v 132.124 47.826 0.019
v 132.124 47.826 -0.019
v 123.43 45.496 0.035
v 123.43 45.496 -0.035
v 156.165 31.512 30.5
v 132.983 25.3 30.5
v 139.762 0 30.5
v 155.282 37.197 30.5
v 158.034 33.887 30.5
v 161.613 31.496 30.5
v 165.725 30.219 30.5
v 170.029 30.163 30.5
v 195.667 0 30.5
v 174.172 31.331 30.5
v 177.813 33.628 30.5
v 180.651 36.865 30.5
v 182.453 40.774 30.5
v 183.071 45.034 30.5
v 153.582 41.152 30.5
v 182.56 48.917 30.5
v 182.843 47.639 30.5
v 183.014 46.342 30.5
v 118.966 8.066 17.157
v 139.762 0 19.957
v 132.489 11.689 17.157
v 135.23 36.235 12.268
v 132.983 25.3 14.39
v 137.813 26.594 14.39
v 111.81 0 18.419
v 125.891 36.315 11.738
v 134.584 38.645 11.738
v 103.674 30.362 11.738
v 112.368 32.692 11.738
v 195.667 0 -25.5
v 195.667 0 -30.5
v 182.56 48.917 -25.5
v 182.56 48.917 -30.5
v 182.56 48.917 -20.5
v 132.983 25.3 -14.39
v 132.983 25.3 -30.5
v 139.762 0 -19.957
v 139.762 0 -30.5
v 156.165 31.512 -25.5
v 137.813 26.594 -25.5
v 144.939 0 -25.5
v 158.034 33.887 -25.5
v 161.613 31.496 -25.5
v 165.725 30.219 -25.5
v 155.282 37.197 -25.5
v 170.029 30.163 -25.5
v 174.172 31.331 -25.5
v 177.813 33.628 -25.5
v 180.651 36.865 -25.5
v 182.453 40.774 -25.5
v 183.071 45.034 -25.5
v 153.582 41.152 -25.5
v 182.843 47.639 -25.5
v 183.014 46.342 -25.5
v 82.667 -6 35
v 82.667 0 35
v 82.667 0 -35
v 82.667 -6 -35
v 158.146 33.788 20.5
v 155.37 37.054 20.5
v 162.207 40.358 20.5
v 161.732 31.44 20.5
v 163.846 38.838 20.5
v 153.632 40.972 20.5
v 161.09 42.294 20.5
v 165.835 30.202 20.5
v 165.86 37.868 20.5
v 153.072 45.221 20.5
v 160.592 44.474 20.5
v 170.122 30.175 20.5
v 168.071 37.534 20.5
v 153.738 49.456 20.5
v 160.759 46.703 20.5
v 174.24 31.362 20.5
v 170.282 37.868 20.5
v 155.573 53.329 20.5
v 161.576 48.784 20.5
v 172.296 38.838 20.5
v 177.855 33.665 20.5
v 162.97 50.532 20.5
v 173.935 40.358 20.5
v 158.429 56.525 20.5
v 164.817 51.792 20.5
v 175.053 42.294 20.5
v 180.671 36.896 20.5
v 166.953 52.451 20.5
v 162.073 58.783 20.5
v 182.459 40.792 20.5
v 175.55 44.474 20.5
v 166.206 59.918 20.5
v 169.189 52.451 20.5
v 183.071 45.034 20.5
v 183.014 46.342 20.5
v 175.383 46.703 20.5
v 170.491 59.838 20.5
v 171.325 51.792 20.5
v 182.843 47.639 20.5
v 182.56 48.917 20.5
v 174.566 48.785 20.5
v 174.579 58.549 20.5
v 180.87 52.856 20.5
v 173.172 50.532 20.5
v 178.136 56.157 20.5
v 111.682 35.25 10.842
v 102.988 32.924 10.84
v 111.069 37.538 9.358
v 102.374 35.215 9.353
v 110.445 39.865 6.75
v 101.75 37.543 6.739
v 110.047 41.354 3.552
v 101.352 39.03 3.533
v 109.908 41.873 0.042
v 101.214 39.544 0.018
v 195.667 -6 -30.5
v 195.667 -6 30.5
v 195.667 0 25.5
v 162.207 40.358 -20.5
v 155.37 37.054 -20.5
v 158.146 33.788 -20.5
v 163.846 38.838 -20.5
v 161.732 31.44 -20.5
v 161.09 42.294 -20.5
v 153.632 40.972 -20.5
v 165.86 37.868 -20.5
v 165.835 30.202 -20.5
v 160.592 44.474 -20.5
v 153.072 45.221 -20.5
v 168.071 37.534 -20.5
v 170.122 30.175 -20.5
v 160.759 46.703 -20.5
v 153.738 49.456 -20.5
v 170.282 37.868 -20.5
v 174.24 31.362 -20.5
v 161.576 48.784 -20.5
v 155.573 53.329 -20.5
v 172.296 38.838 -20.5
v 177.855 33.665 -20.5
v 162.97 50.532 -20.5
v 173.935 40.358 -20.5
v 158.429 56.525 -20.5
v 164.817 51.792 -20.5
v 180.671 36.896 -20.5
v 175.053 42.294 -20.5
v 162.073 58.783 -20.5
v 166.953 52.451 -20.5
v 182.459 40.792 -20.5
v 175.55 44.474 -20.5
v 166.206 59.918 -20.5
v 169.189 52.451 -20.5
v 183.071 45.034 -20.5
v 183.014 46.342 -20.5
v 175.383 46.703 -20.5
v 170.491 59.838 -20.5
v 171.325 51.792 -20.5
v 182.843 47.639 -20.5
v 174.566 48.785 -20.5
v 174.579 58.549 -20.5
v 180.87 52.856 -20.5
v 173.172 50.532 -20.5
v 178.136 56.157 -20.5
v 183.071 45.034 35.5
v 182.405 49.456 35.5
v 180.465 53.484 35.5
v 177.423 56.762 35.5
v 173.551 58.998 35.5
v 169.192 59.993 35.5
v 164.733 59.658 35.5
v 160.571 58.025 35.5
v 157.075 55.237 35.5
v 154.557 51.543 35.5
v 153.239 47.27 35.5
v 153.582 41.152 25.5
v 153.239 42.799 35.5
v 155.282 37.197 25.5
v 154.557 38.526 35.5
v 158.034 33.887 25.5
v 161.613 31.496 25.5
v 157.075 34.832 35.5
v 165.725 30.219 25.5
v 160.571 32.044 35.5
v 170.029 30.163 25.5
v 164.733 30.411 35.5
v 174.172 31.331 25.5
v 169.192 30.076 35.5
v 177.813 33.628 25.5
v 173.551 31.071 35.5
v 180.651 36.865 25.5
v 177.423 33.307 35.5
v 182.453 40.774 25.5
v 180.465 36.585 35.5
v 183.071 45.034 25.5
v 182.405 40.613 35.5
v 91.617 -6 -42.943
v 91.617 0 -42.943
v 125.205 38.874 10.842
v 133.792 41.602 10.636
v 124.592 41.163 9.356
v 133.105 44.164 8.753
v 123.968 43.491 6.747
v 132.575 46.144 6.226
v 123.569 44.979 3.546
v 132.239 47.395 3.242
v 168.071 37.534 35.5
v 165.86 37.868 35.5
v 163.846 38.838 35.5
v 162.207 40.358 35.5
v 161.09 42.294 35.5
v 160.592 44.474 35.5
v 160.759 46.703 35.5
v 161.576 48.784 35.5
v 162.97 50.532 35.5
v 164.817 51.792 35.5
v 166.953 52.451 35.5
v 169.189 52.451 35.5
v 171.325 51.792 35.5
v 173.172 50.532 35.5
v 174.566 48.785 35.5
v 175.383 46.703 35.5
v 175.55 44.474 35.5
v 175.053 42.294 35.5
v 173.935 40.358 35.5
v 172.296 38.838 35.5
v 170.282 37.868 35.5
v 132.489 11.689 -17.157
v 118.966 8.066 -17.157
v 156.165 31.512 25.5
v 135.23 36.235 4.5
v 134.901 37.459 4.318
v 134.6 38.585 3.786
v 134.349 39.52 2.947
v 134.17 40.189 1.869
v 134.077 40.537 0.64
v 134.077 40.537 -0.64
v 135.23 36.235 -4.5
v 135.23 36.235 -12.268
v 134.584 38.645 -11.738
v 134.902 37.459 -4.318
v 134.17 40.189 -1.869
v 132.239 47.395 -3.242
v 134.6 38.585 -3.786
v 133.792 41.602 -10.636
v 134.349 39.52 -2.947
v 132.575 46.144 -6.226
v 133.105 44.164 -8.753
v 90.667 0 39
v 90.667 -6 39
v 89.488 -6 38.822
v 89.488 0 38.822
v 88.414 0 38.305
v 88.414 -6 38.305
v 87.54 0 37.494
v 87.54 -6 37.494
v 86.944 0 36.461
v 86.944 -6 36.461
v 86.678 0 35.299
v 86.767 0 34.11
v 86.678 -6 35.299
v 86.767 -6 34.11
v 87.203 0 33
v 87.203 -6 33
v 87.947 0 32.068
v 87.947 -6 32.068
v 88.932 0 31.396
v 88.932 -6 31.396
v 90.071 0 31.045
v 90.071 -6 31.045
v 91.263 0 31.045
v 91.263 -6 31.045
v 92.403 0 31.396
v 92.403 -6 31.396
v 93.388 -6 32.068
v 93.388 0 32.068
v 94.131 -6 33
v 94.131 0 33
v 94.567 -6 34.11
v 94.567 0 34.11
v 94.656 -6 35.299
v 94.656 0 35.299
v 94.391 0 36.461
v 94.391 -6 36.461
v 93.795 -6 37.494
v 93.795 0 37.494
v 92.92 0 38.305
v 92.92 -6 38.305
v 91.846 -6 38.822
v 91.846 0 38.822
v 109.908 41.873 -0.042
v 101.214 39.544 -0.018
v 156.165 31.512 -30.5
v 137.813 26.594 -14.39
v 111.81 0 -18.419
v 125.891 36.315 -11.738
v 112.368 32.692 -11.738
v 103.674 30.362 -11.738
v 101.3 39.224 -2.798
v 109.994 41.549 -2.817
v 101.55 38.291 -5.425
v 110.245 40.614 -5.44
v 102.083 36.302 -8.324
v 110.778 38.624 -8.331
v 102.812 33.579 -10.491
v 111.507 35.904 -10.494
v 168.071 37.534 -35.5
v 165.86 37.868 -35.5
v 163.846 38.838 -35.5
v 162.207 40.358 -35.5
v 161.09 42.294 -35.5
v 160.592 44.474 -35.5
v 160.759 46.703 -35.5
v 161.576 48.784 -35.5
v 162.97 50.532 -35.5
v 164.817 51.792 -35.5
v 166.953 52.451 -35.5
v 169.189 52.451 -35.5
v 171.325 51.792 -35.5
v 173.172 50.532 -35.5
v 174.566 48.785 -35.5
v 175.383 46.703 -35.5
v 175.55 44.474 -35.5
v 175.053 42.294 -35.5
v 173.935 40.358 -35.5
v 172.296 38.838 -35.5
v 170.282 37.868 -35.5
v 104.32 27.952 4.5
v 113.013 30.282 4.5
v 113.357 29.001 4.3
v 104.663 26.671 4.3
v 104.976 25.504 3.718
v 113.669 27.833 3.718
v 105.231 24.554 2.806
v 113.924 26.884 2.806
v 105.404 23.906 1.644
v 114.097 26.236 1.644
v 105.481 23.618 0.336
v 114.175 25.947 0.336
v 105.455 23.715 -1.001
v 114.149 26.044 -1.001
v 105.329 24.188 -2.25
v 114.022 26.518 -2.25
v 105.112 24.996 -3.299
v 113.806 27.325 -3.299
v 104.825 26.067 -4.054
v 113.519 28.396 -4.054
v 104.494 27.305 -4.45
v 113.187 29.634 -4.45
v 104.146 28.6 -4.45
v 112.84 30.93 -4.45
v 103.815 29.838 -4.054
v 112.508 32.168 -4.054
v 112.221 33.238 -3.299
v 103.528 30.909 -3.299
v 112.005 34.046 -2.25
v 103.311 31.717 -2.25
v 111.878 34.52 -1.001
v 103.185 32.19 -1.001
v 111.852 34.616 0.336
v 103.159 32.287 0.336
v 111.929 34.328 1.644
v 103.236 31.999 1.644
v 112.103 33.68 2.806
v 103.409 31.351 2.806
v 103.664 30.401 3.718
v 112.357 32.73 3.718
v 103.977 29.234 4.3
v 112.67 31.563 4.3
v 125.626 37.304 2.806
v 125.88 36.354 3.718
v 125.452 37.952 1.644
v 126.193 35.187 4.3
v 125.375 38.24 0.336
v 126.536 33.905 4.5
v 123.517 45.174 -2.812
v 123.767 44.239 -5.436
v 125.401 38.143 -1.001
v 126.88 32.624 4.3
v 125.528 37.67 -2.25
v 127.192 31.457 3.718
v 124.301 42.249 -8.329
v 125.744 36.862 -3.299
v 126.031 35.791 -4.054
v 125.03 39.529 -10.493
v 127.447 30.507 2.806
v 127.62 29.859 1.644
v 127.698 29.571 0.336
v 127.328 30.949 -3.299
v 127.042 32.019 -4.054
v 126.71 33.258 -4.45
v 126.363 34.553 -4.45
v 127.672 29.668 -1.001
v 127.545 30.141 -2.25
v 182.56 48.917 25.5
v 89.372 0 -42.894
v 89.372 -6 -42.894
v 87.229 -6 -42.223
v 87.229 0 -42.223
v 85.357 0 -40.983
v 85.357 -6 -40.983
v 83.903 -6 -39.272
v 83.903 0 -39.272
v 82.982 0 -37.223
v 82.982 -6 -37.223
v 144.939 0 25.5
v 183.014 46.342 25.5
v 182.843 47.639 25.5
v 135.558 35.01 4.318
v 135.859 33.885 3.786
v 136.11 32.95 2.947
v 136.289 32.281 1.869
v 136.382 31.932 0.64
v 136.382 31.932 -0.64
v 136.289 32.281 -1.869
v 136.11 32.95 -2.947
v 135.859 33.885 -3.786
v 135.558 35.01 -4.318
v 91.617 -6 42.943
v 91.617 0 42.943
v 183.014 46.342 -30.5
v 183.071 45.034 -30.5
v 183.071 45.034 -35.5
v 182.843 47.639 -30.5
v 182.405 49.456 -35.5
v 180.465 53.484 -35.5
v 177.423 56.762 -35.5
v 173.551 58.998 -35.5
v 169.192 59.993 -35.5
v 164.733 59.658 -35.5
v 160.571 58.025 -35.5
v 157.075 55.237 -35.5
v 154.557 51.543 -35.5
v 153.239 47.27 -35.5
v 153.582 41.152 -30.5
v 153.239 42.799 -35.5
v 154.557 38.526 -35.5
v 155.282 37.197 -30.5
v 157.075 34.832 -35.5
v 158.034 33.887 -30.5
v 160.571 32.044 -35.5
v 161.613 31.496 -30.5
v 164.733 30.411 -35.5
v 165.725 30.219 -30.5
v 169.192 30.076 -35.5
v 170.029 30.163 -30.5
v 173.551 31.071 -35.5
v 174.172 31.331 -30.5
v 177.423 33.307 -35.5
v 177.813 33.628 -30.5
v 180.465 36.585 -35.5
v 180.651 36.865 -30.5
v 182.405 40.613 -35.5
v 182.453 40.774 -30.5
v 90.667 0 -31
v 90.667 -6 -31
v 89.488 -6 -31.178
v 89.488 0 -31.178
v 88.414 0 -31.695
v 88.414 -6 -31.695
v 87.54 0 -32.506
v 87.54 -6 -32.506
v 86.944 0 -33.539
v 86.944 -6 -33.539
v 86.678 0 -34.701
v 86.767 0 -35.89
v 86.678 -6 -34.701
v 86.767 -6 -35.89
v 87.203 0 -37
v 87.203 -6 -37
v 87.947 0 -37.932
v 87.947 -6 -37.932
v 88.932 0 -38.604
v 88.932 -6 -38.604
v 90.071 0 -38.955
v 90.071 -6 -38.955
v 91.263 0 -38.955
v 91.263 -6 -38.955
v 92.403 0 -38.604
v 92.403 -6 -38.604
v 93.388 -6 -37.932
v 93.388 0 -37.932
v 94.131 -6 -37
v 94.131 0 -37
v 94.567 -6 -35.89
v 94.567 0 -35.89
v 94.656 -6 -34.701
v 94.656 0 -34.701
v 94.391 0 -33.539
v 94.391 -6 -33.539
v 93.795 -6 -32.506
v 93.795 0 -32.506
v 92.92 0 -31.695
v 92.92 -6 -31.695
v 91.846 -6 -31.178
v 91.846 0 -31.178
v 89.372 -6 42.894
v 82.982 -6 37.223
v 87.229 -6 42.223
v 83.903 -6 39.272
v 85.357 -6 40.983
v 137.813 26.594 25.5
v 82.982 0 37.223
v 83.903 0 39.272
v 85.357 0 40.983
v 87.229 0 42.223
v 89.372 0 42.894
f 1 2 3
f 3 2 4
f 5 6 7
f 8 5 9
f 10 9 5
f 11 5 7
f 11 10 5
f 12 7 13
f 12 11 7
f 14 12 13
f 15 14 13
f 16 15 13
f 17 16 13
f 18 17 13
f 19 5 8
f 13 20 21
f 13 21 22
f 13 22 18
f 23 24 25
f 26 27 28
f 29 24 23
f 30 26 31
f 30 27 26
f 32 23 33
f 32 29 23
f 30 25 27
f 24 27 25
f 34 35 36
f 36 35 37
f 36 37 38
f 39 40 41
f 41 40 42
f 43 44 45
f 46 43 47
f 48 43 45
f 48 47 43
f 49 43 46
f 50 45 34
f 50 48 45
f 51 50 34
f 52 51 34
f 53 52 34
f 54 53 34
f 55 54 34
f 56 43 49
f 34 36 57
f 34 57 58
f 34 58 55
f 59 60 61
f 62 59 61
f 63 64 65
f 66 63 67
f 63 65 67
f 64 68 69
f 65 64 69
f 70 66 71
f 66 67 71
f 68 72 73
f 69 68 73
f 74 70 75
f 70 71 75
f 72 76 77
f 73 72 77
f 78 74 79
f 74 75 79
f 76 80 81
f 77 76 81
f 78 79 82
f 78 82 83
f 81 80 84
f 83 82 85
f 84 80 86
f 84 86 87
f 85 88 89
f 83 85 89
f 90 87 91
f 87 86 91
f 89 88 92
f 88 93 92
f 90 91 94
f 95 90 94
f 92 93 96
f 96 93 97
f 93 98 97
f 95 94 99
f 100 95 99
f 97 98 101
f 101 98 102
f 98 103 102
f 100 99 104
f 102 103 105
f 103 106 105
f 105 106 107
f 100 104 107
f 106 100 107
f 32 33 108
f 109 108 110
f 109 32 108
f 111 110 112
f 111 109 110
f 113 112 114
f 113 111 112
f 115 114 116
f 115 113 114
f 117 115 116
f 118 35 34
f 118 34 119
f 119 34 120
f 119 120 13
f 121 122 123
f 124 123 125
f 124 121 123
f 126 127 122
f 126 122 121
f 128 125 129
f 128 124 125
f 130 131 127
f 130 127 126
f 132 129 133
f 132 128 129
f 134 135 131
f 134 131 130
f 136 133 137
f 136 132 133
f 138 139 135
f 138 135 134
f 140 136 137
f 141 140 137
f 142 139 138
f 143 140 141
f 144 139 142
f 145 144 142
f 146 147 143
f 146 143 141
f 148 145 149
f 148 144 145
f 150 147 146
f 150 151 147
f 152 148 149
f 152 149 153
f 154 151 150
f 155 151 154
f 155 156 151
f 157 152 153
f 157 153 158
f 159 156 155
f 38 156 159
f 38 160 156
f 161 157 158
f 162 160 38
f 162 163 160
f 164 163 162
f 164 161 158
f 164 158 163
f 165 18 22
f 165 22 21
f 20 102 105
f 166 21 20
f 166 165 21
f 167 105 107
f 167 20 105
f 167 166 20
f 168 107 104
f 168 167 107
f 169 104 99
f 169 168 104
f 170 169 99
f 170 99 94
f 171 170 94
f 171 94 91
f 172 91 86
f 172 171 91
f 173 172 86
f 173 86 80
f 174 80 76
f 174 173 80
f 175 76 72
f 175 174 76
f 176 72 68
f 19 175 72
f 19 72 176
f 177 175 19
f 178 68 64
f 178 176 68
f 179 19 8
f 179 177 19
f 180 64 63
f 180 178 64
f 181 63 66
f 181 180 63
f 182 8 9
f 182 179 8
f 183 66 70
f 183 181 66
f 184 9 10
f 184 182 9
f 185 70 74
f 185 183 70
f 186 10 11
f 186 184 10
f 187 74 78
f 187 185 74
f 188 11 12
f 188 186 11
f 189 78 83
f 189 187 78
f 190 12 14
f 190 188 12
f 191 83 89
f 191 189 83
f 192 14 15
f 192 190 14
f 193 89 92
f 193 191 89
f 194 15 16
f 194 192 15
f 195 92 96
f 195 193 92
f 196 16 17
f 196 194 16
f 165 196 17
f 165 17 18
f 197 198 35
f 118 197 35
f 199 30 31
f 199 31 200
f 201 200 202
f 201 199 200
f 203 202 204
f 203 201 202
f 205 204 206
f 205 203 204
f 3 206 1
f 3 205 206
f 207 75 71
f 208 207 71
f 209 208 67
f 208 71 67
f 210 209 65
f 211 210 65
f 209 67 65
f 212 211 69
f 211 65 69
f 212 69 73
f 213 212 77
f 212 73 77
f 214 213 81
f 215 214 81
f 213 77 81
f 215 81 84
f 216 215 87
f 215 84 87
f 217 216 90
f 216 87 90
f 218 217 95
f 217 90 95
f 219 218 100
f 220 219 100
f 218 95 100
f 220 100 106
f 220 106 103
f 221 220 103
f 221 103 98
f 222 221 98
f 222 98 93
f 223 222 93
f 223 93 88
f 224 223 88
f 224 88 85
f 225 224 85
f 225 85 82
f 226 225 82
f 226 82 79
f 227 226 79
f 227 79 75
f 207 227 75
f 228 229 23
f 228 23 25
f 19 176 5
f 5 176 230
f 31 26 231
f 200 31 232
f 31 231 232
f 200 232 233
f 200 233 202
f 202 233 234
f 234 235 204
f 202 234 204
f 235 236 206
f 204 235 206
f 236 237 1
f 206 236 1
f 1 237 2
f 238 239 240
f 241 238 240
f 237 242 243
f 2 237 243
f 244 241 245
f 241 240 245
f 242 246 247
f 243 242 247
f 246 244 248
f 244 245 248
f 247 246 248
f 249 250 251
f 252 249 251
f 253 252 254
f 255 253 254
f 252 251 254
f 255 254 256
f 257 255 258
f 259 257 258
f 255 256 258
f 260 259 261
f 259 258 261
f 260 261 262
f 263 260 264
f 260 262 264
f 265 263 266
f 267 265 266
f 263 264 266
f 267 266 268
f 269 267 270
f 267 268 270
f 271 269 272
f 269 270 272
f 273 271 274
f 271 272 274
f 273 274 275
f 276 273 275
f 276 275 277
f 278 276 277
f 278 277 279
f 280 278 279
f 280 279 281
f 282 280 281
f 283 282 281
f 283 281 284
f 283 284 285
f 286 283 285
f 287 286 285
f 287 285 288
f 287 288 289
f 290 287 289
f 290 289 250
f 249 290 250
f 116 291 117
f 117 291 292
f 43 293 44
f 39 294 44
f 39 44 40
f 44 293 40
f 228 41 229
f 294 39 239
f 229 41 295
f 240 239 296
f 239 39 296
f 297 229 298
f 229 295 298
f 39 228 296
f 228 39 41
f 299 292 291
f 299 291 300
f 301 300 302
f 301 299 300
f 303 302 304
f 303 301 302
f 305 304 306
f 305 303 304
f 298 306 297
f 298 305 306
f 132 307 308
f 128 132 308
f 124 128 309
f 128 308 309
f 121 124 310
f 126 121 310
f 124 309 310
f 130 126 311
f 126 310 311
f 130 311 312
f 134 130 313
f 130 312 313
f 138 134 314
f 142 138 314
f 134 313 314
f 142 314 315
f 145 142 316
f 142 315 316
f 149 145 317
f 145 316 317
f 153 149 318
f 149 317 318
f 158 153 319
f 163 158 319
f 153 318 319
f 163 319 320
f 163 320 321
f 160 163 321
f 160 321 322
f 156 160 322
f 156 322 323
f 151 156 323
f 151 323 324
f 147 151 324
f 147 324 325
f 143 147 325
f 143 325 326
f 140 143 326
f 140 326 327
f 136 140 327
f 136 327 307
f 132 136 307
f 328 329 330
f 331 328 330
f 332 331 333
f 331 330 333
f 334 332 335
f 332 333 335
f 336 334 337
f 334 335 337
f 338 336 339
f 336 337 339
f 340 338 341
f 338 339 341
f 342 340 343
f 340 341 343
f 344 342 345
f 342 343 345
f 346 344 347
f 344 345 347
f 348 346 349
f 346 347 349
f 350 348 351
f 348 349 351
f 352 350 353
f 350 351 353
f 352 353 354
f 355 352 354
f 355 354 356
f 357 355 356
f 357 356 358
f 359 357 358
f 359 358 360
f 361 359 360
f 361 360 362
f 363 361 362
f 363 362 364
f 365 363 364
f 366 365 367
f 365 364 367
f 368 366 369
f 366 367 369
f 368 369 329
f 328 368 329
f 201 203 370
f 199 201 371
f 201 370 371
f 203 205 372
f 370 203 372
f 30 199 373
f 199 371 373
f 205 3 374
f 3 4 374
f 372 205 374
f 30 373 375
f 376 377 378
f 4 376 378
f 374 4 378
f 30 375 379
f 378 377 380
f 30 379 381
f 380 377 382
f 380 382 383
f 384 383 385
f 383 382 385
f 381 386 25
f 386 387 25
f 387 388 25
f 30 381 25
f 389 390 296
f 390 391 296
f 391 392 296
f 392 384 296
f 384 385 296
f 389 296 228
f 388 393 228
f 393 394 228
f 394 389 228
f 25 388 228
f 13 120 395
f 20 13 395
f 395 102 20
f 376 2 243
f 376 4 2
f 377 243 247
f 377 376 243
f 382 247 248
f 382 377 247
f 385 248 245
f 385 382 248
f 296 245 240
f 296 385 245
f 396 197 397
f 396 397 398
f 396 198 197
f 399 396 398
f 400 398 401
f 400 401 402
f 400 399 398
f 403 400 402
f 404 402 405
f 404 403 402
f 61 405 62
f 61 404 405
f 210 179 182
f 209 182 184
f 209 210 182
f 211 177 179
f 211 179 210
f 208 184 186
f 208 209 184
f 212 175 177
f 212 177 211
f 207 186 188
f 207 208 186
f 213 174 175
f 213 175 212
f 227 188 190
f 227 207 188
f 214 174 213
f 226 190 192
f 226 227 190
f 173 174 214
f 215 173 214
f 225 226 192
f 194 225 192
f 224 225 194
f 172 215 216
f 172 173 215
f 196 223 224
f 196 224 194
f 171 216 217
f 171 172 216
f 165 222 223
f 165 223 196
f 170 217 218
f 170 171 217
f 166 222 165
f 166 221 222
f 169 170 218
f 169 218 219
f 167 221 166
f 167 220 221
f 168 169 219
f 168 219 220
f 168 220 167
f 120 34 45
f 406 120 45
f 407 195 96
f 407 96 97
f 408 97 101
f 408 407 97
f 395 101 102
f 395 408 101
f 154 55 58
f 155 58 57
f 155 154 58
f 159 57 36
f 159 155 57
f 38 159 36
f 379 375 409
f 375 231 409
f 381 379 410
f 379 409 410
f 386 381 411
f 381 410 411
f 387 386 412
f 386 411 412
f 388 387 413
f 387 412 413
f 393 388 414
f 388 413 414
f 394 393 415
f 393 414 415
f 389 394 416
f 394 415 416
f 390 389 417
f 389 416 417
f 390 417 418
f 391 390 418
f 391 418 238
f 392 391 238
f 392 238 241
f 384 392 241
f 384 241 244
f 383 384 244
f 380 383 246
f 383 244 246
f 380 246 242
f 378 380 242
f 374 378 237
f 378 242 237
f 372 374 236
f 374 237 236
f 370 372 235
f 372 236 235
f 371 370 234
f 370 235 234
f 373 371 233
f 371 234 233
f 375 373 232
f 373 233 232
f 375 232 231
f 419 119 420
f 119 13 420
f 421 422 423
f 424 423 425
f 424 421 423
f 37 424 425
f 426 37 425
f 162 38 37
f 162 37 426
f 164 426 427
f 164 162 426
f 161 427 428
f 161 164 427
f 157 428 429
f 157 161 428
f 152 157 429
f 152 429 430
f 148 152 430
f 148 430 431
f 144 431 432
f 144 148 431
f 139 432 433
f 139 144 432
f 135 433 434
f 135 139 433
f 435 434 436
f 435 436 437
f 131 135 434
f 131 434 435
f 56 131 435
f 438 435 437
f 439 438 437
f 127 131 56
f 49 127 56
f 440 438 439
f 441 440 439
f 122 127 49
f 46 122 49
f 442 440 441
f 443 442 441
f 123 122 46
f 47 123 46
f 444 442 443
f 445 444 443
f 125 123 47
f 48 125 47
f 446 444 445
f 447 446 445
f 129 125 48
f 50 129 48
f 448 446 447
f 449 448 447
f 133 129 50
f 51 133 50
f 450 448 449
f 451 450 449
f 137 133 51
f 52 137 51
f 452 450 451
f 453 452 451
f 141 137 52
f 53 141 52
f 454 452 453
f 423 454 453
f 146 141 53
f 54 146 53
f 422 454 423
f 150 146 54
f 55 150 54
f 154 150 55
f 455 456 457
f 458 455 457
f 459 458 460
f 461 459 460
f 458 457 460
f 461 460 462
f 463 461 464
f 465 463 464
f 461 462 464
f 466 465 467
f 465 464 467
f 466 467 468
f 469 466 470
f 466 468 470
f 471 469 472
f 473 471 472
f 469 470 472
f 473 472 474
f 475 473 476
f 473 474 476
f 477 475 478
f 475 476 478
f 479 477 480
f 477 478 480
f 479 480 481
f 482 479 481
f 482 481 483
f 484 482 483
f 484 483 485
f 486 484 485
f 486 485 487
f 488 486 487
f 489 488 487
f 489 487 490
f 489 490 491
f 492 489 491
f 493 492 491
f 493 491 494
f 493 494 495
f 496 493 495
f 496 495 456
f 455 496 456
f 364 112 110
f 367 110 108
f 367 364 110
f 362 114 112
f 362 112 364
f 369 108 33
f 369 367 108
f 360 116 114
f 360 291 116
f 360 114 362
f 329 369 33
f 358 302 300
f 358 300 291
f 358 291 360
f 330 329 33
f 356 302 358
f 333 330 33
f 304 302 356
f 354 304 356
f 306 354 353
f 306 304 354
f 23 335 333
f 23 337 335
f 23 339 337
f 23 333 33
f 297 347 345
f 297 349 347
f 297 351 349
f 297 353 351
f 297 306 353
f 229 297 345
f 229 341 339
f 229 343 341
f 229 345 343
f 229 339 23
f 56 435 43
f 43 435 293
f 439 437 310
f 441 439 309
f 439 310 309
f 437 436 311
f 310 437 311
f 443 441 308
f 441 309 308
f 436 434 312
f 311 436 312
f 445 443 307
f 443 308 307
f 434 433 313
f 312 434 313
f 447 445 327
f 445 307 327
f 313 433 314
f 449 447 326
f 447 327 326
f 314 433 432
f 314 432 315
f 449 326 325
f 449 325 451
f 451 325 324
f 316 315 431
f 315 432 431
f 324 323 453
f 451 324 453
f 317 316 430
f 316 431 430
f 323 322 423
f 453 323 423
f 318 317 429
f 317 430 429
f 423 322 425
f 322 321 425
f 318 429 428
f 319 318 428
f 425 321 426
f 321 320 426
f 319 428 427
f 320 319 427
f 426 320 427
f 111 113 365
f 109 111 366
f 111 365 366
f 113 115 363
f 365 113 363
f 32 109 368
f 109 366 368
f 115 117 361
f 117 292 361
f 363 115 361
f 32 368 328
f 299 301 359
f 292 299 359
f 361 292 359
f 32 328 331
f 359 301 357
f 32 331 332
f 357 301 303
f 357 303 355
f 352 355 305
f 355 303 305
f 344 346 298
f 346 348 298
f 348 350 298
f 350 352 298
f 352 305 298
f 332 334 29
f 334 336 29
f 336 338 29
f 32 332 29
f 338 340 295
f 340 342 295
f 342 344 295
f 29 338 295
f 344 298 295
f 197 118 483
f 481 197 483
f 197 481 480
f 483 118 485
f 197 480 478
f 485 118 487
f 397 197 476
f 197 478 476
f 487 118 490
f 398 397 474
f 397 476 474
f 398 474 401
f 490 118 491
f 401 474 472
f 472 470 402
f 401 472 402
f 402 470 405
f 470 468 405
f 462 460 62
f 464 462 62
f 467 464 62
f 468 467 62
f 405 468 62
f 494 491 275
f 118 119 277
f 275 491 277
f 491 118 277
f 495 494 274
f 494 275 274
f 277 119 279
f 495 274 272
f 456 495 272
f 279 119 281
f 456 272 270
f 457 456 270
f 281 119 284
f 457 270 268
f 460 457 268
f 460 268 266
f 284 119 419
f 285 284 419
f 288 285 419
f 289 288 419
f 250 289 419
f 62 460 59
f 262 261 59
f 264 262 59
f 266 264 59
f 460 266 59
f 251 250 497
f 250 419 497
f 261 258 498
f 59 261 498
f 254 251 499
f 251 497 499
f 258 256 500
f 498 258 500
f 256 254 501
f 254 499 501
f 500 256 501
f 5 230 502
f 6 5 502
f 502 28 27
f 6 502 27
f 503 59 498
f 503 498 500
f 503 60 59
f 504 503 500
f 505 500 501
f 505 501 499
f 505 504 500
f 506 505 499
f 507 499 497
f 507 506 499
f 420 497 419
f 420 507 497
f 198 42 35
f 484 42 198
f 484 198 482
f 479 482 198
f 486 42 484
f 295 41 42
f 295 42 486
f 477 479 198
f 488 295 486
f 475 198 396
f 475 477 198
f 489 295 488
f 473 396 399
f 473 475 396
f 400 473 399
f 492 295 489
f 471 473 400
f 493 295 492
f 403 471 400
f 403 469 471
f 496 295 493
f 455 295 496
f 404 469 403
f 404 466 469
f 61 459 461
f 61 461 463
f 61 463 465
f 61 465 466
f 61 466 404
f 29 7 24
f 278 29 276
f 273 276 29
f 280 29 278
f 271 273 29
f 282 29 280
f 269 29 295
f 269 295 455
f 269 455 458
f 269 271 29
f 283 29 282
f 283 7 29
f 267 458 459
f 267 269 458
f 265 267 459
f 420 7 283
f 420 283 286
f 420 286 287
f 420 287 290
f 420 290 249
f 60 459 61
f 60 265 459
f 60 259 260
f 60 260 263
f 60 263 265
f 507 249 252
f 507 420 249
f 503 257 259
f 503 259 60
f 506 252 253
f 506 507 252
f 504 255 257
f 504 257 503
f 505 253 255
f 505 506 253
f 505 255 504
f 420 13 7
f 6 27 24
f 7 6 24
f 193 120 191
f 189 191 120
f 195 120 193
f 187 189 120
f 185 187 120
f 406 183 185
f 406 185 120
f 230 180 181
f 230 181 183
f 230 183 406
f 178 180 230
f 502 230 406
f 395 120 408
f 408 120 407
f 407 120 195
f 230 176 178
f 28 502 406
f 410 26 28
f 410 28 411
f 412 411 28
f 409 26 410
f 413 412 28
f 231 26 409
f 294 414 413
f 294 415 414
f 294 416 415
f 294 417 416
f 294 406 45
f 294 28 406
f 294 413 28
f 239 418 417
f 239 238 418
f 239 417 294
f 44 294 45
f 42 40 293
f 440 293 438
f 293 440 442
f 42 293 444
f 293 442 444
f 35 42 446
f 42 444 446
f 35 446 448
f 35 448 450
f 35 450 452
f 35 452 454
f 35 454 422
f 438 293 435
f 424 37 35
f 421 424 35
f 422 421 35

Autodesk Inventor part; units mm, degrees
ref_plane "YZ Plane" through (0, 0, 0) normal (1, 0, 0) x (0, 1, 0)
ref_plane "XZ Plane" through (0, 0, 0) normal (0, 1, 0) x (-1, 0, 0)
ref_plane "XY Plane" through (0, 0, 0) normal (0, 0, 1) x (1, 0, 0)
sketch "Sketch1" plane through (0, 0, 0) normal (0, 0, 1) x (1, 0, 0)
  line L0 (-28.9877, 0) -> (173.9264, 0) projected
  line L1 (-29.4372, -7.8877) -> (176.6233, 47.3261) projected
  line L2 (101.2142, 39.5436) -> (111.8098, 0)
  line L3 (111.8098, 0) -> (144.9387, 0)
  line L4 (144.9387, 0) -> (132.1238, 47.8258)
  line L5 (132.1238, 47.8258) -> (123.4305, 45.4964)
  line L6 (123.4305, 45.4964) -> (132.4891, 11.689)
  line L7 (109.9075, 41.8729) -> (118.9662, 8.0655)
  line L8 (118.9662, 8.0655) -> (132.4891, 11.689)
  line L9 (109.9075, 41.8729) -> (101.2142, 39.5436)
  point P0 (0, 0)
  point P1 (132.0574, 26.729)
  point P2 (96.5926, 25.8819)
  dimension "d0" = 12
  dimension "d1" = 9
  dimension "d2" = 14
  dimension "d3" = 9
  dimension "d4" = 35
  dimension "d5" = 117
extrude "Extrusion1" add sketch "Sketch1" along normal mid plane 50 contours L2 L1 L7 L8 L6 L4 L0 | L2 L9 L7 L1 | L1 L6 L5 L4
sketch "Sketch3" plane through (111.8098, 0, -25) normal (-0.9659, -0.2588, 0) x (0, 0, 1)
  line L0 (25, 64.8401) -> (25, -46.4712) projected
  line L1 (50, 40.9385) -> (0, 40.9385) projected
  line L2 (50, -8.5744) -> (0, -8.5744) projected
  line L3 (50, 40.9385) -> (0, 40.9385) projected
  line L4 (1.57, -23.5744) -> (48.43, -23.5744)
  line L5 (1.57, -23.5744) -> (13.2622, 31.4335)
  line L6 (48.43, -23.5744) -> (36.7378, 31.4335)
  arc A0 (36.7378, 31.4335) -> (13.2622, 31.4335) centre (25, 28.9385) ccw
  dimension "d8" = 12
  dimension "d9" = 78
  dimension "d10" = 78
  dimension "d12" = 15
extrude "Extrusion2" cut sketch "Sketch3" against normal through all keep common part
sketch "Sketch4" plane through (0, 0, 0) normal (0, 0, 1) x (1, 0, 0)
  point P0 (0, 0)
sketch "Sketch5" plane through (0, 0, 0) normal (0, 0, 1) x (1, 0, 0)
  point P0 (0, 0)
sketch "Sketch6" plane through (0, 0, 0) normal (0, 0, 1) x (1, 0, 0)
  line L0 (-28.9877, 0) -> (173.9264, 0) projected
  point P0 (0, 0)
sketch "Sketch7" plane through (0, 0, 0) normal (0, 0, 1) x (1, 0, 0)
  line L0 (-28.9877, 0) -> (173.9264, 0) projected
  line L1 (-29.4372, -7.8877) -> (176.6233, 47.3261) projected
  line L2 (132.9832, 25.3) -> (139.7623, 0)
  line L3 (139.7623, 0) -> (195.6672, 0)
  line L4 (195.6672, 0) -> (182.56, 48.9168)
  line L5 (182.56, 48.9168) -> (153.5822, 41.1522)
  line L6 (153.5822, 41.1522) -> (156.1654, 31.5117)
  line L7 (156.1654, 31.5117) -> (132.9832, 25.3)
  line L8 (134.5839, 38.6446) -> (144.9387, 0) projected
  line L9 (132.1238, 47.8258) -> (134.5839, 38.6446) projected
  point P0 (0, 0)
  dimension "d15" = 5
  dimension "d16" = 49
  dimension "d17" = 30
  dimension "d18" = 25.3
extrude "Extrusion3" add sketch "Sketch7" along normal mid plane 61 contours L2 L7 L8 L0 | L8 L7 L6 L1 L5 L4 L3 L0
sketch "Sketch8" plane through (153.5822, 41.1522, 30.5) normal (-0.2588, 0.9659, 0) x (0.9659, 0.2588, 0)
  line L0 (-19, 56) -> (35, 56)
  line L1 (35, 56) -> (35, 5)
  line L2 (35, 5) -> (-19, 5)
  line L3 (-19, 5) -> (-19, 56)
  line L4 (0, 61) -> (30, 61) projected
  line L5 (30, 61) -> (30, 0) projected
  line L6 (30, 0) -> (0, 0) projected
  line L7 (0, 61) -> (0, 0) projected
  line L8 (-24, 0) -> (-24, 16.1105) projected
  line L9 (-24, 61) -> (0, 61) projected
  point P0 (-159, 30.5)
  dimension "d23" = 5
  dimension "d25" = 5
  dimension "d26" = 5
  dimension "d28" = 5
extrude "Extrusion4" cut sketch "Sketch8" against normal through all contours L0 L7 L2 L3 | L0 L5 L2 L7 | L0 L1 L2 L5
sketch "Sketch9" plane through (0, 0, 0) normal (0, 0, 1) x (1, 0, 0)
  line L0 (153.5822, 41.1522) -> (182.56, 48.9168) projected
  line L1 (182.56, 48.9168) -> (195.6672, 0) projected
  line L2 (-39.5137, -10.5877) -> (237.0823, 63.526) projected
  line L3 (195.6672, 0) -> (182.56, 48.9168) projected
  line L4 (182.56, 48.9168) -> (153.5822, 41.1522) projected
  circle A0 centre (168.0711, 45.0345) radius 15
  point P0 (0, 0)
  dimension "d81" = 30
extrude "Extrusion5" add sketch "Sketch9" along normal mid plane 71
sketch "Sketch11" plane through (0, 0, 0) normal (0, 0, 1) x (1, 0, 0)
  circle A0 centre (168.0711, 45.0345) radius 19.5
  circle A1 centre (168.0711, 45.0345) radius 15 projected
  point P0 (0, 0)
  dimension "d36" = 39
extrude "Extrusion6" cut sketch "Sketch11" along normal mid plane 41 contours A0 | A1
sketch "Sketch12" plane through (0, 0, 0) normal (0, 1, 0) x (-1, 0, 0)
  line L0 (-234.8006, 0) -> (39.1334, 0) projected
  line L1 (-195.6672, -30.5) -> (-195.6672, 30.5)
  line L2 (-195.6672, 30.5) -> (-91.6172, 42.9434)
  line L3 (-82.6672, 35) -> (-82.6672, -35)
  line L4 (-91.6172, -42.9434) -> (-195.6672, -30.5)
  arc A0 (-91.6172, -42.9434) -> (-82.6672, -35) centre (-90.6672, -35) ccw
  arc A1 (-82.6672, 35) -> (-91.6172, 42.9434) centre (-90.6672, 35) ccw
  point P0 (0, 0)
  dimension "d39" = 8
  dimension "d40" = 8
  dimension "d41" = 113
  dimension "d42" = 70
  dimension "d43" = 35
extrude "Extrusion7" add sketch "Sketch12" against normal blind 6
sketch "Sketch14" plane through (168.0711, 45.0345, -20.5) normal (0, 0, 1) x (1, 0, 0)
  circle A0 centre (0, 0) radius 15 projected
  point P0 (-168.0711, -45.0345)
hole "Hole1" at (168.0711, 45.0345, -20.5) direction (0, 0, -1) diameter 15 end through all
sketch "Sketch15" plane through (168.0711, 45.0345, 35.5) normal (0, 0, 1) x (1, 0, 0)
  circle A0 centre (0, 0) radius 15 projected
  point P0 (-168.0711, -45.0345)
hole "Hole2" at (168.0711, 45.0345, 35.5) direction (0, 0, -1) diameter 15 end through all
sketch "Sketch16" plane through (0, 0, 0) normal (0, 1, 0) x (1, 0, 0)
  arc A0 (91.6172, 42.9434) -> (82.6672, 35) centre (90.6672, 35) ccw projected
  point P0 (0, 0)
hole "Hole3" at (90.6672, 0, -35) direction (0, -1, 0) diameter 8 end through all
sketch "Sketch17" plane through (0, 0, 0) normal (0, 1, 0) x (1, 0, 0)
  arc A0 (82.6672, -35) -> (91.6172, -42.9434) centre (90.6672, -35) ccw projected
  point P0 (0, 0)
hole "Hole4" at (90.6672, 0, 35) direction (0, -1, 0) diameter 8 end through all
sketch "Sketch18" plane through (104.32, 27.9525, 0) normal (-0.9659, -0.2588, 0) x (0, 0, 1)
  arc A0 (11.7378, 2.4949) -> (-11.7378, 2.4949) centre (0, 0) ccw projected
  point P0 (0, 0)
hole "Hole5" at (104.32, 27.9525, 0) direction (0.9659, 0.2588, 0) diameter 9 end through all
equation "\"d81\" = d17"
equation "\"d36\" = 1.3 * d17"
equation "\"d43\" = 0.5 * d42"
properties part number "Reper" material "Steel, Carbon"
